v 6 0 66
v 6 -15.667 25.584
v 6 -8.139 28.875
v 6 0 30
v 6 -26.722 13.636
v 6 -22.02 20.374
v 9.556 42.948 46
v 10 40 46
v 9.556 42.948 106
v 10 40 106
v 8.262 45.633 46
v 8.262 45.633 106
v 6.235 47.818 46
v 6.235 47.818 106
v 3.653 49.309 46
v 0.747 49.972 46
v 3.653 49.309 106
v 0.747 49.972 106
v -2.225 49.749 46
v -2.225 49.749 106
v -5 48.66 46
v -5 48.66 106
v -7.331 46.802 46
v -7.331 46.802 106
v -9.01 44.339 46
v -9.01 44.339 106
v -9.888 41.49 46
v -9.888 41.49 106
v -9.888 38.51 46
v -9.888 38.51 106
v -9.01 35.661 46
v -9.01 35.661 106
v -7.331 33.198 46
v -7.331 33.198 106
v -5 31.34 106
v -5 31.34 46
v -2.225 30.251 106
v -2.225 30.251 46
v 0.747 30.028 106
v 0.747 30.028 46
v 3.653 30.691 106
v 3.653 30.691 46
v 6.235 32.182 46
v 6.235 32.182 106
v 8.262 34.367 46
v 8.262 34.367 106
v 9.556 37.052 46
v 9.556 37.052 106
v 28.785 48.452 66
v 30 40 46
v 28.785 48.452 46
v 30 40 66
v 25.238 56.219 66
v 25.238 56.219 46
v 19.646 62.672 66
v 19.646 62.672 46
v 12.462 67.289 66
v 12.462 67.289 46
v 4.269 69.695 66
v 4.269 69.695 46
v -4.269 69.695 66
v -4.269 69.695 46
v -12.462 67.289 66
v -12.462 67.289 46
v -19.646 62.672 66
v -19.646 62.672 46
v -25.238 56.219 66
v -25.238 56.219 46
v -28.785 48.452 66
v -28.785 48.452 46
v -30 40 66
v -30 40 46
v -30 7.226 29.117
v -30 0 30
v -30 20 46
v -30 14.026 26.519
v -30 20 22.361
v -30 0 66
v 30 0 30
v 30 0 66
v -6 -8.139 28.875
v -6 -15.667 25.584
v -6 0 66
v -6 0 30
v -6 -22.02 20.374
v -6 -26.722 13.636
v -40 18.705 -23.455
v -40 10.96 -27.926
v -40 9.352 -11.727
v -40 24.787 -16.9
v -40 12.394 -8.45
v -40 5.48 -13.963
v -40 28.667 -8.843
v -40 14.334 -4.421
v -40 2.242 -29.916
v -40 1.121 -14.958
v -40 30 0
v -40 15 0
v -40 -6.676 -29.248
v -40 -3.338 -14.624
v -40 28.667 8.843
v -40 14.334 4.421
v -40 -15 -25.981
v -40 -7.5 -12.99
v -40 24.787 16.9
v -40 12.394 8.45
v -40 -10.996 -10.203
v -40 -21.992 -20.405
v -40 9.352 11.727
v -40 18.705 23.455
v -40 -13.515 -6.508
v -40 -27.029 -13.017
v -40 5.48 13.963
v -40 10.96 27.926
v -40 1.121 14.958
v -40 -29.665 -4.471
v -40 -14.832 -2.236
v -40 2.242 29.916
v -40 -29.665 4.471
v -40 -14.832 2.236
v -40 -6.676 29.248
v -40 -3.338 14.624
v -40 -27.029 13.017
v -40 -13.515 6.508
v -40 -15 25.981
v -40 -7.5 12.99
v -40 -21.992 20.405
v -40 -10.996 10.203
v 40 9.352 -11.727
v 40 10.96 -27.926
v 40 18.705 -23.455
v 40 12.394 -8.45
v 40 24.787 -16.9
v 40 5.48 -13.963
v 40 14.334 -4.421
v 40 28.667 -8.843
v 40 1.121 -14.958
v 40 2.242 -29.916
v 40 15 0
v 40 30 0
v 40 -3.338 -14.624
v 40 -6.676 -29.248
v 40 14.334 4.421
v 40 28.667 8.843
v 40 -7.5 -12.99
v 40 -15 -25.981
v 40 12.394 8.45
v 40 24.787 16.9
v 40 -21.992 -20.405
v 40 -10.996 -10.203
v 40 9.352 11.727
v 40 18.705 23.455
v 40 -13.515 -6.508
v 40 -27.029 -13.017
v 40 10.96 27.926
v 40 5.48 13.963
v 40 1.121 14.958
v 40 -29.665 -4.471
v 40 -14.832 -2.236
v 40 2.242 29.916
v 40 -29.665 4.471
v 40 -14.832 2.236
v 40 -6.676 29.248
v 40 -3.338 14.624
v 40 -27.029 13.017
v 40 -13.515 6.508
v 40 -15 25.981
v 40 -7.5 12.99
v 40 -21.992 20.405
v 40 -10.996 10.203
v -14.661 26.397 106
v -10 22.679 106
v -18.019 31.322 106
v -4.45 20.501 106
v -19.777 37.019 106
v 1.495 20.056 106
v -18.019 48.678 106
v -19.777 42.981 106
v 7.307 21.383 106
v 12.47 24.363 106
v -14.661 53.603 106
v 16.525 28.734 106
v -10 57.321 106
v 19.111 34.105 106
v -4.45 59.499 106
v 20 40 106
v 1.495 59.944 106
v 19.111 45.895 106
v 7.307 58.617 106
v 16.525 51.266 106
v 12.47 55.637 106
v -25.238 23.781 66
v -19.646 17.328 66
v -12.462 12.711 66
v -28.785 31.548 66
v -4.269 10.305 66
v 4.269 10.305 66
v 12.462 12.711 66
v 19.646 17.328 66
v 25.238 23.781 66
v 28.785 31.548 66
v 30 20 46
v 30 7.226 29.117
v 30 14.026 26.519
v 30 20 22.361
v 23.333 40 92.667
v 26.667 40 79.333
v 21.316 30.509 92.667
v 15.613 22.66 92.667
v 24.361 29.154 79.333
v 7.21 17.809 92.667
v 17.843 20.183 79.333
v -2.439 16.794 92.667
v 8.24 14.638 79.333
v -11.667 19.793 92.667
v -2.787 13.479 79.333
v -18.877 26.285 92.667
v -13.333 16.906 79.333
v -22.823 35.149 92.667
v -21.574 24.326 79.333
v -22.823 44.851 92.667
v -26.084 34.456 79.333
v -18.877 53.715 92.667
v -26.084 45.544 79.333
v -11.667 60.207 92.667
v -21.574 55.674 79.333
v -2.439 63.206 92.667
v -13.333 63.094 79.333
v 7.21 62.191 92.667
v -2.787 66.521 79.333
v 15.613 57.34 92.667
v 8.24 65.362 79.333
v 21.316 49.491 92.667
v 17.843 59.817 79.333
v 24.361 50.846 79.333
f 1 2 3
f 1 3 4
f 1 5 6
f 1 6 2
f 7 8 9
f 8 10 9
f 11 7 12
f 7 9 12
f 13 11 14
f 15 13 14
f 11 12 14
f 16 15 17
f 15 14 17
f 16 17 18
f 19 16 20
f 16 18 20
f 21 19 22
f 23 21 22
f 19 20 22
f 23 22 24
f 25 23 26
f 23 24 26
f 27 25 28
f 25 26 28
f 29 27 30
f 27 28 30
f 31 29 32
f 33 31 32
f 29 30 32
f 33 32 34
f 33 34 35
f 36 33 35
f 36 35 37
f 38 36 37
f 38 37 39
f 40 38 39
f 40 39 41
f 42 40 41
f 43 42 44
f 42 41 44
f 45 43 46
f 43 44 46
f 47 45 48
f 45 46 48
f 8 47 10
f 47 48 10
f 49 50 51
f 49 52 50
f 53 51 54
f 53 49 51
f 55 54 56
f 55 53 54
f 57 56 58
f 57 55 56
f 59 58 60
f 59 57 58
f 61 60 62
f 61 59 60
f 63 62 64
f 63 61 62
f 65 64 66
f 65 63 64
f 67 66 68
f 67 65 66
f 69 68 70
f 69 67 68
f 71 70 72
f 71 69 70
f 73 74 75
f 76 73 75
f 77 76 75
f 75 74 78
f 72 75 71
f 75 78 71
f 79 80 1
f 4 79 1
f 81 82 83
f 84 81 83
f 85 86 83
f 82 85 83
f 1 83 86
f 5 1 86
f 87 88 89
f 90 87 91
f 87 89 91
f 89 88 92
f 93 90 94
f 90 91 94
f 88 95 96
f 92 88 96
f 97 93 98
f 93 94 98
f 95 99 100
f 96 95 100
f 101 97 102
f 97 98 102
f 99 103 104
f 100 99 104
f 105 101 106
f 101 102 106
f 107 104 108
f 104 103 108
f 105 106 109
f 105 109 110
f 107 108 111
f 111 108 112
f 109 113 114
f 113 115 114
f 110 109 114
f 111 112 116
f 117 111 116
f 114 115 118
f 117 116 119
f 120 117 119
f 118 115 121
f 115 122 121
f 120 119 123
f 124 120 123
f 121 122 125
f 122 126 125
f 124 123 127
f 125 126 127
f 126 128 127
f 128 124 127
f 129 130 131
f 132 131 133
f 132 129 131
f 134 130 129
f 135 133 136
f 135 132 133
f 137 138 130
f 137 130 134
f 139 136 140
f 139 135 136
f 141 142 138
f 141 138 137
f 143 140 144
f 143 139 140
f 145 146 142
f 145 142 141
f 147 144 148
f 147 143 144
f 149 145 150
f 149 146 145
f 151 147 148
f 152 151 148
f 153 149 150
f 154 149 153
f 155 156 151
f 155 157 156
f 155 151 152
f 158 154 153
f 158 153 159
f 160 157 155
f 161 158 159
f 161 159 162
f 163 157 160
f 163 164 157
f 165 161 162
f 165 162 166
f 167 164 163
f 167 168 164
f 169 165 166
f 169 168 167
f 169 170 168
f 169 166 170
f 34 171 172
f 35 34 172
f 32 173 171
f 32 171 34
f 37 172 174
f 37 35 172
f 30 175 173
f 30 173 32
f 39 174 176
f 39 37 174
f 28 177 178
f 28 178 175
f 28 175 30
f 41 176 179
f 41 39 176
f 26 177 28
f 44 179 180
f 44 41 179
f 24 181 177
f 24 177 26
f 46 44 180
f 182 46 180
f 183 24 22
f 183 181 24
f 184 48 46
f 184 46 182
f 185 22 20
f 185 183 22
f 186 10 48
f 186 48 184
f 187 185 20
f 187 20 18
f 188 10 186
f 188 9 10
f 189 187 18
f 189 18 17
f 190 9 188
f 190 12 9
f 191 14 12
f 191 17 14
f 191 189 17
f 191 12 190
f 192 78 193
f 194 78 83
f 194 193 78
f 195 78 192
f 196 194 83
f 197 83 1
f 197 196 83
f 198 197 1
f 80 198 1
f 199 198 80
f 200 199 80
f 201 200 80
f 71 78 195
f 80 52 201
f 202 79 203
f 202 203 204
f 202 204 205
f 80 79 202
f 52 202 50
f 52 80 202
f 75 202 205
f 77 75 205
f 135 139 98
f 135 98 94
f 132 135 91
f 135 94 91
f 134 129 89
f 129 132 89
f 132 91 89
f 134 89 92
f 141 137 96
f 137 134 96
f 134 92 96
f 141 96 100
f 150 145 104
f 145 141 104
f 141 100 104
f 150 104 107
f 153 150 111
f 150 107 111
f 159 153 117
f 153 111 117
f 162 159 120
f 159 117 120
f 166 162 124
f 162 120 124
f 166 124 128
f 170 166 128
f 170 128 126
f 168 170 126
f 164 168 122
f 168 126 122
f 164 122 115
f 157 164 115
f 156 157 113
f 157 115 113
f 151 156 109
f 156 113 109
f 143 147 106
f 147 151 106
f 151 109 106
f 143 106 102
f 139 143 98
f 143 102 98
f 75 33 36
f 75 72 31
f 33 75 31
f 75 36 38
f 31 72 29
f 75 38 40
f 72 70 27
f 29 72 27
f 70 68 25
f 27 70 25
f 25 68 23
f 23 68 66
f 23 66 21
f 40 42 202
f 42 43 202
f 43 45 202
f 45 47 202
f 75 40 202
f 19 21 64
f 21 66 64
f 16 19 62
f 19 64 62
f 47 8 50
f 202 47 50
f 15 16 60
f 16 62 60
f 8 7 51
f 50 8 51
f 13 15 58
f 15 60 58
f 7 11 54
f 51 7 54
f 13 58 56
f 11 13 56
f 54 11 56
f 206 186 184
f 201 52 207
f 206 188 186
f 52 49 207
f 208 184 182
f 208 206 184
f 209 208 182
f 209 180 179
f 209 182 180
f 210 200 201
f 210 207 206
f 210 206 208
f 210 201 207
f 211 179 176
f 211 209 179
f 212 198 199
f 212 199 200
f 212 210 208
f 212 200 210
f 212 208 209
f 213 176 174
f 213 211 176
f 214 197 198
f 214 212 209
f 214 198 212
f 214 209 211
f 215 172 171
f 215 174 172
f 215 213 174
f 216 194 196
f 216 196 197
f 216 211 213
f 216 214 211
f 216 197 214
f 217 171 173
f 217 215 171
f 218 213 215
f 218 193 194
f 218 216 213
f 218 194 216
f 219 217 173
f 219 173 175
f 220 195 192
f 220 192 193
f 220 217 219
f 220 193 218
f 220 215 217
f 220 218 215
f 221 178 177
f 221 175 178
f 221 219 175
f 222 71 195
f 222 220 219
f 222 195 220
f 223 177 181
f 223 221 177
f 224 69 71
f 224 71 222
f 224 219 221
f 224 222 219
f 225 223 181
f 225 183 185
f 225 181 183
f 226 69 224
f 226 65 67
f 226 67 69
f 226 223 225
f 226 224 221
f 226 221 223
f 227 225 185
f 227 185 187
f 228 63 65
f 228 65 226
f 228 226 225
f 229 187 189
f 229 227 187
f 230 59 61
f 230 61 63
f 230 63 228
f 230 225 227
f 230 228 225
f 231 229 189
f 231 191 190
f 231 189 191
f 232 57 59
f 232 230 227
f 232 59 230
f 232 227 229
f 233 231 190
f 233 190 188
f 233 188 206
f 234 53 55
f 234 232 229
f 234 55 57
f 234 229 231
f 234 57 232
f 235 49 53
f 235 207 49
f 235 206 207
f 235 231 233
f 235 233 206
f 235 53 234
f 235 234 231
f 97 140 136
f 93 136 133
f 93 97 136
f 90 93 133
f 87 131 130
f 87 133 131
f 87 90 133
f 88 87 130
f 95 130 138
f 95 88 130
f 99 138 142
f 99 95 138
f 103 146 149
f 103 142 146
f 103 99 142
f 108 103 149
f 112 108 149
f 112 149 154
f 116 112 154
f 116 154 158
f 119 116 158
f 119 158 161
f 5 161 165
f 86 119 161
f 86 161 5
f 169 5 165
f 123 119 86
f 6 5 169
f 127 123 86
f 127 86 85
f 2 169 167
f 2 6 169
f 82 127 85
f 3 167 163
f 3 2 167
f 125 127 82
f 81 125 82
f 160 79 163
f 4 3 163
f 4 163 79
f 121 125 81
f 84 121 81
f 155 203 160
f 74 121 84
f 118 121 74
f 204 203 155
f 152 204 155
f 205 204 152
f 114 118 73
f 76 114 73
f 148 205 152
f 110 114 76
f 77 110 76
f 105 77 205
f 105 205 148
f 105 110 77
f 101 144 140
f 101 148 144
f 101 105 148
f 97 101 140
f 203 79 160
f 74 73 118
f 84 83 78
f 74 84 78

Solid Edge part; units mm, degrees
sketch "Sketch1" plane through (0, 0, 0) normal (1, 0, 0) x (0, 1, 0)
  circle A0 centre (0, 0) radius 30
  circle A1 centre (0, 0) radius 15
extrude "Protrusion1" add sketch "Sketch1" along normal mid plane 80
sketch "Sketch2" plane through (0, 0, 66) normal (0, 0, 1) x (1, 0, 0)
  circle A0 centre (0, 40) radius 30
sketch "Sketch3" plane through (0, 0, 106) normal (0, 0, 1) x (1, 0, 0)
  circle A0 centre (0, 40) radius 20
loft "LoftedProtrusion1" add profiles "Sketch2", "Sketch3"
sketch "Sketch4" plane through (0, 0, 66) normal (0, 0, 1) x (1, 0, 0)
  line L0 (30, 0) -> (30, 40)
  arc A0 (-30, 40) -> (30, 40) centre (0, 40) cw
  line L1 (-30, 0) -> (-30, 40)
  line L2 (30, 0) -> (-30, 0)
extrude "ExtrudedProtrusion_2" add sketch "Sketch4" against normal blind 20
sketch "Sketch5" plane through (0, 0, 106) normal (0, 0, 1) x (1, 0, 0)
  circle A0 centre (0, 40) radius 10
extrude "Cutout1" cut sketch "Sketch5" against normal up to vertex (60 mm away)
sketch "Sketch6" plane through (30, 20, 56) normal (1, 0, 0) x (0, 1, 0)
  line L0 (-20, -10) -> (-20, -26)
  arc A0 (-20, -26) -> (0, -33.6393) centre (-20, -56) cw
  line L1 (0, -10) -> (0, -33.6393)
  line L2 (-20, -10) -> (0, -10)
extrude "ExtrudedProtrusion_3" add sketch "Sketch6" against normal blind 60
sketch "Sketch7" plane through (0, 0, 0) normal (1, 0, 0) x (0, 1, 0)
  line L0 (0, 66) -> (-26.7217, 13.6364)
  arc A0 (-26.7217, 13.6364) -> (0, 30) centre (0, 0) cw
  line L1 (0, 66) -> (0, 30)
extrude "ExtrudedProtrusion_4" add sketch "Sketch7" along normal mid plane 12
